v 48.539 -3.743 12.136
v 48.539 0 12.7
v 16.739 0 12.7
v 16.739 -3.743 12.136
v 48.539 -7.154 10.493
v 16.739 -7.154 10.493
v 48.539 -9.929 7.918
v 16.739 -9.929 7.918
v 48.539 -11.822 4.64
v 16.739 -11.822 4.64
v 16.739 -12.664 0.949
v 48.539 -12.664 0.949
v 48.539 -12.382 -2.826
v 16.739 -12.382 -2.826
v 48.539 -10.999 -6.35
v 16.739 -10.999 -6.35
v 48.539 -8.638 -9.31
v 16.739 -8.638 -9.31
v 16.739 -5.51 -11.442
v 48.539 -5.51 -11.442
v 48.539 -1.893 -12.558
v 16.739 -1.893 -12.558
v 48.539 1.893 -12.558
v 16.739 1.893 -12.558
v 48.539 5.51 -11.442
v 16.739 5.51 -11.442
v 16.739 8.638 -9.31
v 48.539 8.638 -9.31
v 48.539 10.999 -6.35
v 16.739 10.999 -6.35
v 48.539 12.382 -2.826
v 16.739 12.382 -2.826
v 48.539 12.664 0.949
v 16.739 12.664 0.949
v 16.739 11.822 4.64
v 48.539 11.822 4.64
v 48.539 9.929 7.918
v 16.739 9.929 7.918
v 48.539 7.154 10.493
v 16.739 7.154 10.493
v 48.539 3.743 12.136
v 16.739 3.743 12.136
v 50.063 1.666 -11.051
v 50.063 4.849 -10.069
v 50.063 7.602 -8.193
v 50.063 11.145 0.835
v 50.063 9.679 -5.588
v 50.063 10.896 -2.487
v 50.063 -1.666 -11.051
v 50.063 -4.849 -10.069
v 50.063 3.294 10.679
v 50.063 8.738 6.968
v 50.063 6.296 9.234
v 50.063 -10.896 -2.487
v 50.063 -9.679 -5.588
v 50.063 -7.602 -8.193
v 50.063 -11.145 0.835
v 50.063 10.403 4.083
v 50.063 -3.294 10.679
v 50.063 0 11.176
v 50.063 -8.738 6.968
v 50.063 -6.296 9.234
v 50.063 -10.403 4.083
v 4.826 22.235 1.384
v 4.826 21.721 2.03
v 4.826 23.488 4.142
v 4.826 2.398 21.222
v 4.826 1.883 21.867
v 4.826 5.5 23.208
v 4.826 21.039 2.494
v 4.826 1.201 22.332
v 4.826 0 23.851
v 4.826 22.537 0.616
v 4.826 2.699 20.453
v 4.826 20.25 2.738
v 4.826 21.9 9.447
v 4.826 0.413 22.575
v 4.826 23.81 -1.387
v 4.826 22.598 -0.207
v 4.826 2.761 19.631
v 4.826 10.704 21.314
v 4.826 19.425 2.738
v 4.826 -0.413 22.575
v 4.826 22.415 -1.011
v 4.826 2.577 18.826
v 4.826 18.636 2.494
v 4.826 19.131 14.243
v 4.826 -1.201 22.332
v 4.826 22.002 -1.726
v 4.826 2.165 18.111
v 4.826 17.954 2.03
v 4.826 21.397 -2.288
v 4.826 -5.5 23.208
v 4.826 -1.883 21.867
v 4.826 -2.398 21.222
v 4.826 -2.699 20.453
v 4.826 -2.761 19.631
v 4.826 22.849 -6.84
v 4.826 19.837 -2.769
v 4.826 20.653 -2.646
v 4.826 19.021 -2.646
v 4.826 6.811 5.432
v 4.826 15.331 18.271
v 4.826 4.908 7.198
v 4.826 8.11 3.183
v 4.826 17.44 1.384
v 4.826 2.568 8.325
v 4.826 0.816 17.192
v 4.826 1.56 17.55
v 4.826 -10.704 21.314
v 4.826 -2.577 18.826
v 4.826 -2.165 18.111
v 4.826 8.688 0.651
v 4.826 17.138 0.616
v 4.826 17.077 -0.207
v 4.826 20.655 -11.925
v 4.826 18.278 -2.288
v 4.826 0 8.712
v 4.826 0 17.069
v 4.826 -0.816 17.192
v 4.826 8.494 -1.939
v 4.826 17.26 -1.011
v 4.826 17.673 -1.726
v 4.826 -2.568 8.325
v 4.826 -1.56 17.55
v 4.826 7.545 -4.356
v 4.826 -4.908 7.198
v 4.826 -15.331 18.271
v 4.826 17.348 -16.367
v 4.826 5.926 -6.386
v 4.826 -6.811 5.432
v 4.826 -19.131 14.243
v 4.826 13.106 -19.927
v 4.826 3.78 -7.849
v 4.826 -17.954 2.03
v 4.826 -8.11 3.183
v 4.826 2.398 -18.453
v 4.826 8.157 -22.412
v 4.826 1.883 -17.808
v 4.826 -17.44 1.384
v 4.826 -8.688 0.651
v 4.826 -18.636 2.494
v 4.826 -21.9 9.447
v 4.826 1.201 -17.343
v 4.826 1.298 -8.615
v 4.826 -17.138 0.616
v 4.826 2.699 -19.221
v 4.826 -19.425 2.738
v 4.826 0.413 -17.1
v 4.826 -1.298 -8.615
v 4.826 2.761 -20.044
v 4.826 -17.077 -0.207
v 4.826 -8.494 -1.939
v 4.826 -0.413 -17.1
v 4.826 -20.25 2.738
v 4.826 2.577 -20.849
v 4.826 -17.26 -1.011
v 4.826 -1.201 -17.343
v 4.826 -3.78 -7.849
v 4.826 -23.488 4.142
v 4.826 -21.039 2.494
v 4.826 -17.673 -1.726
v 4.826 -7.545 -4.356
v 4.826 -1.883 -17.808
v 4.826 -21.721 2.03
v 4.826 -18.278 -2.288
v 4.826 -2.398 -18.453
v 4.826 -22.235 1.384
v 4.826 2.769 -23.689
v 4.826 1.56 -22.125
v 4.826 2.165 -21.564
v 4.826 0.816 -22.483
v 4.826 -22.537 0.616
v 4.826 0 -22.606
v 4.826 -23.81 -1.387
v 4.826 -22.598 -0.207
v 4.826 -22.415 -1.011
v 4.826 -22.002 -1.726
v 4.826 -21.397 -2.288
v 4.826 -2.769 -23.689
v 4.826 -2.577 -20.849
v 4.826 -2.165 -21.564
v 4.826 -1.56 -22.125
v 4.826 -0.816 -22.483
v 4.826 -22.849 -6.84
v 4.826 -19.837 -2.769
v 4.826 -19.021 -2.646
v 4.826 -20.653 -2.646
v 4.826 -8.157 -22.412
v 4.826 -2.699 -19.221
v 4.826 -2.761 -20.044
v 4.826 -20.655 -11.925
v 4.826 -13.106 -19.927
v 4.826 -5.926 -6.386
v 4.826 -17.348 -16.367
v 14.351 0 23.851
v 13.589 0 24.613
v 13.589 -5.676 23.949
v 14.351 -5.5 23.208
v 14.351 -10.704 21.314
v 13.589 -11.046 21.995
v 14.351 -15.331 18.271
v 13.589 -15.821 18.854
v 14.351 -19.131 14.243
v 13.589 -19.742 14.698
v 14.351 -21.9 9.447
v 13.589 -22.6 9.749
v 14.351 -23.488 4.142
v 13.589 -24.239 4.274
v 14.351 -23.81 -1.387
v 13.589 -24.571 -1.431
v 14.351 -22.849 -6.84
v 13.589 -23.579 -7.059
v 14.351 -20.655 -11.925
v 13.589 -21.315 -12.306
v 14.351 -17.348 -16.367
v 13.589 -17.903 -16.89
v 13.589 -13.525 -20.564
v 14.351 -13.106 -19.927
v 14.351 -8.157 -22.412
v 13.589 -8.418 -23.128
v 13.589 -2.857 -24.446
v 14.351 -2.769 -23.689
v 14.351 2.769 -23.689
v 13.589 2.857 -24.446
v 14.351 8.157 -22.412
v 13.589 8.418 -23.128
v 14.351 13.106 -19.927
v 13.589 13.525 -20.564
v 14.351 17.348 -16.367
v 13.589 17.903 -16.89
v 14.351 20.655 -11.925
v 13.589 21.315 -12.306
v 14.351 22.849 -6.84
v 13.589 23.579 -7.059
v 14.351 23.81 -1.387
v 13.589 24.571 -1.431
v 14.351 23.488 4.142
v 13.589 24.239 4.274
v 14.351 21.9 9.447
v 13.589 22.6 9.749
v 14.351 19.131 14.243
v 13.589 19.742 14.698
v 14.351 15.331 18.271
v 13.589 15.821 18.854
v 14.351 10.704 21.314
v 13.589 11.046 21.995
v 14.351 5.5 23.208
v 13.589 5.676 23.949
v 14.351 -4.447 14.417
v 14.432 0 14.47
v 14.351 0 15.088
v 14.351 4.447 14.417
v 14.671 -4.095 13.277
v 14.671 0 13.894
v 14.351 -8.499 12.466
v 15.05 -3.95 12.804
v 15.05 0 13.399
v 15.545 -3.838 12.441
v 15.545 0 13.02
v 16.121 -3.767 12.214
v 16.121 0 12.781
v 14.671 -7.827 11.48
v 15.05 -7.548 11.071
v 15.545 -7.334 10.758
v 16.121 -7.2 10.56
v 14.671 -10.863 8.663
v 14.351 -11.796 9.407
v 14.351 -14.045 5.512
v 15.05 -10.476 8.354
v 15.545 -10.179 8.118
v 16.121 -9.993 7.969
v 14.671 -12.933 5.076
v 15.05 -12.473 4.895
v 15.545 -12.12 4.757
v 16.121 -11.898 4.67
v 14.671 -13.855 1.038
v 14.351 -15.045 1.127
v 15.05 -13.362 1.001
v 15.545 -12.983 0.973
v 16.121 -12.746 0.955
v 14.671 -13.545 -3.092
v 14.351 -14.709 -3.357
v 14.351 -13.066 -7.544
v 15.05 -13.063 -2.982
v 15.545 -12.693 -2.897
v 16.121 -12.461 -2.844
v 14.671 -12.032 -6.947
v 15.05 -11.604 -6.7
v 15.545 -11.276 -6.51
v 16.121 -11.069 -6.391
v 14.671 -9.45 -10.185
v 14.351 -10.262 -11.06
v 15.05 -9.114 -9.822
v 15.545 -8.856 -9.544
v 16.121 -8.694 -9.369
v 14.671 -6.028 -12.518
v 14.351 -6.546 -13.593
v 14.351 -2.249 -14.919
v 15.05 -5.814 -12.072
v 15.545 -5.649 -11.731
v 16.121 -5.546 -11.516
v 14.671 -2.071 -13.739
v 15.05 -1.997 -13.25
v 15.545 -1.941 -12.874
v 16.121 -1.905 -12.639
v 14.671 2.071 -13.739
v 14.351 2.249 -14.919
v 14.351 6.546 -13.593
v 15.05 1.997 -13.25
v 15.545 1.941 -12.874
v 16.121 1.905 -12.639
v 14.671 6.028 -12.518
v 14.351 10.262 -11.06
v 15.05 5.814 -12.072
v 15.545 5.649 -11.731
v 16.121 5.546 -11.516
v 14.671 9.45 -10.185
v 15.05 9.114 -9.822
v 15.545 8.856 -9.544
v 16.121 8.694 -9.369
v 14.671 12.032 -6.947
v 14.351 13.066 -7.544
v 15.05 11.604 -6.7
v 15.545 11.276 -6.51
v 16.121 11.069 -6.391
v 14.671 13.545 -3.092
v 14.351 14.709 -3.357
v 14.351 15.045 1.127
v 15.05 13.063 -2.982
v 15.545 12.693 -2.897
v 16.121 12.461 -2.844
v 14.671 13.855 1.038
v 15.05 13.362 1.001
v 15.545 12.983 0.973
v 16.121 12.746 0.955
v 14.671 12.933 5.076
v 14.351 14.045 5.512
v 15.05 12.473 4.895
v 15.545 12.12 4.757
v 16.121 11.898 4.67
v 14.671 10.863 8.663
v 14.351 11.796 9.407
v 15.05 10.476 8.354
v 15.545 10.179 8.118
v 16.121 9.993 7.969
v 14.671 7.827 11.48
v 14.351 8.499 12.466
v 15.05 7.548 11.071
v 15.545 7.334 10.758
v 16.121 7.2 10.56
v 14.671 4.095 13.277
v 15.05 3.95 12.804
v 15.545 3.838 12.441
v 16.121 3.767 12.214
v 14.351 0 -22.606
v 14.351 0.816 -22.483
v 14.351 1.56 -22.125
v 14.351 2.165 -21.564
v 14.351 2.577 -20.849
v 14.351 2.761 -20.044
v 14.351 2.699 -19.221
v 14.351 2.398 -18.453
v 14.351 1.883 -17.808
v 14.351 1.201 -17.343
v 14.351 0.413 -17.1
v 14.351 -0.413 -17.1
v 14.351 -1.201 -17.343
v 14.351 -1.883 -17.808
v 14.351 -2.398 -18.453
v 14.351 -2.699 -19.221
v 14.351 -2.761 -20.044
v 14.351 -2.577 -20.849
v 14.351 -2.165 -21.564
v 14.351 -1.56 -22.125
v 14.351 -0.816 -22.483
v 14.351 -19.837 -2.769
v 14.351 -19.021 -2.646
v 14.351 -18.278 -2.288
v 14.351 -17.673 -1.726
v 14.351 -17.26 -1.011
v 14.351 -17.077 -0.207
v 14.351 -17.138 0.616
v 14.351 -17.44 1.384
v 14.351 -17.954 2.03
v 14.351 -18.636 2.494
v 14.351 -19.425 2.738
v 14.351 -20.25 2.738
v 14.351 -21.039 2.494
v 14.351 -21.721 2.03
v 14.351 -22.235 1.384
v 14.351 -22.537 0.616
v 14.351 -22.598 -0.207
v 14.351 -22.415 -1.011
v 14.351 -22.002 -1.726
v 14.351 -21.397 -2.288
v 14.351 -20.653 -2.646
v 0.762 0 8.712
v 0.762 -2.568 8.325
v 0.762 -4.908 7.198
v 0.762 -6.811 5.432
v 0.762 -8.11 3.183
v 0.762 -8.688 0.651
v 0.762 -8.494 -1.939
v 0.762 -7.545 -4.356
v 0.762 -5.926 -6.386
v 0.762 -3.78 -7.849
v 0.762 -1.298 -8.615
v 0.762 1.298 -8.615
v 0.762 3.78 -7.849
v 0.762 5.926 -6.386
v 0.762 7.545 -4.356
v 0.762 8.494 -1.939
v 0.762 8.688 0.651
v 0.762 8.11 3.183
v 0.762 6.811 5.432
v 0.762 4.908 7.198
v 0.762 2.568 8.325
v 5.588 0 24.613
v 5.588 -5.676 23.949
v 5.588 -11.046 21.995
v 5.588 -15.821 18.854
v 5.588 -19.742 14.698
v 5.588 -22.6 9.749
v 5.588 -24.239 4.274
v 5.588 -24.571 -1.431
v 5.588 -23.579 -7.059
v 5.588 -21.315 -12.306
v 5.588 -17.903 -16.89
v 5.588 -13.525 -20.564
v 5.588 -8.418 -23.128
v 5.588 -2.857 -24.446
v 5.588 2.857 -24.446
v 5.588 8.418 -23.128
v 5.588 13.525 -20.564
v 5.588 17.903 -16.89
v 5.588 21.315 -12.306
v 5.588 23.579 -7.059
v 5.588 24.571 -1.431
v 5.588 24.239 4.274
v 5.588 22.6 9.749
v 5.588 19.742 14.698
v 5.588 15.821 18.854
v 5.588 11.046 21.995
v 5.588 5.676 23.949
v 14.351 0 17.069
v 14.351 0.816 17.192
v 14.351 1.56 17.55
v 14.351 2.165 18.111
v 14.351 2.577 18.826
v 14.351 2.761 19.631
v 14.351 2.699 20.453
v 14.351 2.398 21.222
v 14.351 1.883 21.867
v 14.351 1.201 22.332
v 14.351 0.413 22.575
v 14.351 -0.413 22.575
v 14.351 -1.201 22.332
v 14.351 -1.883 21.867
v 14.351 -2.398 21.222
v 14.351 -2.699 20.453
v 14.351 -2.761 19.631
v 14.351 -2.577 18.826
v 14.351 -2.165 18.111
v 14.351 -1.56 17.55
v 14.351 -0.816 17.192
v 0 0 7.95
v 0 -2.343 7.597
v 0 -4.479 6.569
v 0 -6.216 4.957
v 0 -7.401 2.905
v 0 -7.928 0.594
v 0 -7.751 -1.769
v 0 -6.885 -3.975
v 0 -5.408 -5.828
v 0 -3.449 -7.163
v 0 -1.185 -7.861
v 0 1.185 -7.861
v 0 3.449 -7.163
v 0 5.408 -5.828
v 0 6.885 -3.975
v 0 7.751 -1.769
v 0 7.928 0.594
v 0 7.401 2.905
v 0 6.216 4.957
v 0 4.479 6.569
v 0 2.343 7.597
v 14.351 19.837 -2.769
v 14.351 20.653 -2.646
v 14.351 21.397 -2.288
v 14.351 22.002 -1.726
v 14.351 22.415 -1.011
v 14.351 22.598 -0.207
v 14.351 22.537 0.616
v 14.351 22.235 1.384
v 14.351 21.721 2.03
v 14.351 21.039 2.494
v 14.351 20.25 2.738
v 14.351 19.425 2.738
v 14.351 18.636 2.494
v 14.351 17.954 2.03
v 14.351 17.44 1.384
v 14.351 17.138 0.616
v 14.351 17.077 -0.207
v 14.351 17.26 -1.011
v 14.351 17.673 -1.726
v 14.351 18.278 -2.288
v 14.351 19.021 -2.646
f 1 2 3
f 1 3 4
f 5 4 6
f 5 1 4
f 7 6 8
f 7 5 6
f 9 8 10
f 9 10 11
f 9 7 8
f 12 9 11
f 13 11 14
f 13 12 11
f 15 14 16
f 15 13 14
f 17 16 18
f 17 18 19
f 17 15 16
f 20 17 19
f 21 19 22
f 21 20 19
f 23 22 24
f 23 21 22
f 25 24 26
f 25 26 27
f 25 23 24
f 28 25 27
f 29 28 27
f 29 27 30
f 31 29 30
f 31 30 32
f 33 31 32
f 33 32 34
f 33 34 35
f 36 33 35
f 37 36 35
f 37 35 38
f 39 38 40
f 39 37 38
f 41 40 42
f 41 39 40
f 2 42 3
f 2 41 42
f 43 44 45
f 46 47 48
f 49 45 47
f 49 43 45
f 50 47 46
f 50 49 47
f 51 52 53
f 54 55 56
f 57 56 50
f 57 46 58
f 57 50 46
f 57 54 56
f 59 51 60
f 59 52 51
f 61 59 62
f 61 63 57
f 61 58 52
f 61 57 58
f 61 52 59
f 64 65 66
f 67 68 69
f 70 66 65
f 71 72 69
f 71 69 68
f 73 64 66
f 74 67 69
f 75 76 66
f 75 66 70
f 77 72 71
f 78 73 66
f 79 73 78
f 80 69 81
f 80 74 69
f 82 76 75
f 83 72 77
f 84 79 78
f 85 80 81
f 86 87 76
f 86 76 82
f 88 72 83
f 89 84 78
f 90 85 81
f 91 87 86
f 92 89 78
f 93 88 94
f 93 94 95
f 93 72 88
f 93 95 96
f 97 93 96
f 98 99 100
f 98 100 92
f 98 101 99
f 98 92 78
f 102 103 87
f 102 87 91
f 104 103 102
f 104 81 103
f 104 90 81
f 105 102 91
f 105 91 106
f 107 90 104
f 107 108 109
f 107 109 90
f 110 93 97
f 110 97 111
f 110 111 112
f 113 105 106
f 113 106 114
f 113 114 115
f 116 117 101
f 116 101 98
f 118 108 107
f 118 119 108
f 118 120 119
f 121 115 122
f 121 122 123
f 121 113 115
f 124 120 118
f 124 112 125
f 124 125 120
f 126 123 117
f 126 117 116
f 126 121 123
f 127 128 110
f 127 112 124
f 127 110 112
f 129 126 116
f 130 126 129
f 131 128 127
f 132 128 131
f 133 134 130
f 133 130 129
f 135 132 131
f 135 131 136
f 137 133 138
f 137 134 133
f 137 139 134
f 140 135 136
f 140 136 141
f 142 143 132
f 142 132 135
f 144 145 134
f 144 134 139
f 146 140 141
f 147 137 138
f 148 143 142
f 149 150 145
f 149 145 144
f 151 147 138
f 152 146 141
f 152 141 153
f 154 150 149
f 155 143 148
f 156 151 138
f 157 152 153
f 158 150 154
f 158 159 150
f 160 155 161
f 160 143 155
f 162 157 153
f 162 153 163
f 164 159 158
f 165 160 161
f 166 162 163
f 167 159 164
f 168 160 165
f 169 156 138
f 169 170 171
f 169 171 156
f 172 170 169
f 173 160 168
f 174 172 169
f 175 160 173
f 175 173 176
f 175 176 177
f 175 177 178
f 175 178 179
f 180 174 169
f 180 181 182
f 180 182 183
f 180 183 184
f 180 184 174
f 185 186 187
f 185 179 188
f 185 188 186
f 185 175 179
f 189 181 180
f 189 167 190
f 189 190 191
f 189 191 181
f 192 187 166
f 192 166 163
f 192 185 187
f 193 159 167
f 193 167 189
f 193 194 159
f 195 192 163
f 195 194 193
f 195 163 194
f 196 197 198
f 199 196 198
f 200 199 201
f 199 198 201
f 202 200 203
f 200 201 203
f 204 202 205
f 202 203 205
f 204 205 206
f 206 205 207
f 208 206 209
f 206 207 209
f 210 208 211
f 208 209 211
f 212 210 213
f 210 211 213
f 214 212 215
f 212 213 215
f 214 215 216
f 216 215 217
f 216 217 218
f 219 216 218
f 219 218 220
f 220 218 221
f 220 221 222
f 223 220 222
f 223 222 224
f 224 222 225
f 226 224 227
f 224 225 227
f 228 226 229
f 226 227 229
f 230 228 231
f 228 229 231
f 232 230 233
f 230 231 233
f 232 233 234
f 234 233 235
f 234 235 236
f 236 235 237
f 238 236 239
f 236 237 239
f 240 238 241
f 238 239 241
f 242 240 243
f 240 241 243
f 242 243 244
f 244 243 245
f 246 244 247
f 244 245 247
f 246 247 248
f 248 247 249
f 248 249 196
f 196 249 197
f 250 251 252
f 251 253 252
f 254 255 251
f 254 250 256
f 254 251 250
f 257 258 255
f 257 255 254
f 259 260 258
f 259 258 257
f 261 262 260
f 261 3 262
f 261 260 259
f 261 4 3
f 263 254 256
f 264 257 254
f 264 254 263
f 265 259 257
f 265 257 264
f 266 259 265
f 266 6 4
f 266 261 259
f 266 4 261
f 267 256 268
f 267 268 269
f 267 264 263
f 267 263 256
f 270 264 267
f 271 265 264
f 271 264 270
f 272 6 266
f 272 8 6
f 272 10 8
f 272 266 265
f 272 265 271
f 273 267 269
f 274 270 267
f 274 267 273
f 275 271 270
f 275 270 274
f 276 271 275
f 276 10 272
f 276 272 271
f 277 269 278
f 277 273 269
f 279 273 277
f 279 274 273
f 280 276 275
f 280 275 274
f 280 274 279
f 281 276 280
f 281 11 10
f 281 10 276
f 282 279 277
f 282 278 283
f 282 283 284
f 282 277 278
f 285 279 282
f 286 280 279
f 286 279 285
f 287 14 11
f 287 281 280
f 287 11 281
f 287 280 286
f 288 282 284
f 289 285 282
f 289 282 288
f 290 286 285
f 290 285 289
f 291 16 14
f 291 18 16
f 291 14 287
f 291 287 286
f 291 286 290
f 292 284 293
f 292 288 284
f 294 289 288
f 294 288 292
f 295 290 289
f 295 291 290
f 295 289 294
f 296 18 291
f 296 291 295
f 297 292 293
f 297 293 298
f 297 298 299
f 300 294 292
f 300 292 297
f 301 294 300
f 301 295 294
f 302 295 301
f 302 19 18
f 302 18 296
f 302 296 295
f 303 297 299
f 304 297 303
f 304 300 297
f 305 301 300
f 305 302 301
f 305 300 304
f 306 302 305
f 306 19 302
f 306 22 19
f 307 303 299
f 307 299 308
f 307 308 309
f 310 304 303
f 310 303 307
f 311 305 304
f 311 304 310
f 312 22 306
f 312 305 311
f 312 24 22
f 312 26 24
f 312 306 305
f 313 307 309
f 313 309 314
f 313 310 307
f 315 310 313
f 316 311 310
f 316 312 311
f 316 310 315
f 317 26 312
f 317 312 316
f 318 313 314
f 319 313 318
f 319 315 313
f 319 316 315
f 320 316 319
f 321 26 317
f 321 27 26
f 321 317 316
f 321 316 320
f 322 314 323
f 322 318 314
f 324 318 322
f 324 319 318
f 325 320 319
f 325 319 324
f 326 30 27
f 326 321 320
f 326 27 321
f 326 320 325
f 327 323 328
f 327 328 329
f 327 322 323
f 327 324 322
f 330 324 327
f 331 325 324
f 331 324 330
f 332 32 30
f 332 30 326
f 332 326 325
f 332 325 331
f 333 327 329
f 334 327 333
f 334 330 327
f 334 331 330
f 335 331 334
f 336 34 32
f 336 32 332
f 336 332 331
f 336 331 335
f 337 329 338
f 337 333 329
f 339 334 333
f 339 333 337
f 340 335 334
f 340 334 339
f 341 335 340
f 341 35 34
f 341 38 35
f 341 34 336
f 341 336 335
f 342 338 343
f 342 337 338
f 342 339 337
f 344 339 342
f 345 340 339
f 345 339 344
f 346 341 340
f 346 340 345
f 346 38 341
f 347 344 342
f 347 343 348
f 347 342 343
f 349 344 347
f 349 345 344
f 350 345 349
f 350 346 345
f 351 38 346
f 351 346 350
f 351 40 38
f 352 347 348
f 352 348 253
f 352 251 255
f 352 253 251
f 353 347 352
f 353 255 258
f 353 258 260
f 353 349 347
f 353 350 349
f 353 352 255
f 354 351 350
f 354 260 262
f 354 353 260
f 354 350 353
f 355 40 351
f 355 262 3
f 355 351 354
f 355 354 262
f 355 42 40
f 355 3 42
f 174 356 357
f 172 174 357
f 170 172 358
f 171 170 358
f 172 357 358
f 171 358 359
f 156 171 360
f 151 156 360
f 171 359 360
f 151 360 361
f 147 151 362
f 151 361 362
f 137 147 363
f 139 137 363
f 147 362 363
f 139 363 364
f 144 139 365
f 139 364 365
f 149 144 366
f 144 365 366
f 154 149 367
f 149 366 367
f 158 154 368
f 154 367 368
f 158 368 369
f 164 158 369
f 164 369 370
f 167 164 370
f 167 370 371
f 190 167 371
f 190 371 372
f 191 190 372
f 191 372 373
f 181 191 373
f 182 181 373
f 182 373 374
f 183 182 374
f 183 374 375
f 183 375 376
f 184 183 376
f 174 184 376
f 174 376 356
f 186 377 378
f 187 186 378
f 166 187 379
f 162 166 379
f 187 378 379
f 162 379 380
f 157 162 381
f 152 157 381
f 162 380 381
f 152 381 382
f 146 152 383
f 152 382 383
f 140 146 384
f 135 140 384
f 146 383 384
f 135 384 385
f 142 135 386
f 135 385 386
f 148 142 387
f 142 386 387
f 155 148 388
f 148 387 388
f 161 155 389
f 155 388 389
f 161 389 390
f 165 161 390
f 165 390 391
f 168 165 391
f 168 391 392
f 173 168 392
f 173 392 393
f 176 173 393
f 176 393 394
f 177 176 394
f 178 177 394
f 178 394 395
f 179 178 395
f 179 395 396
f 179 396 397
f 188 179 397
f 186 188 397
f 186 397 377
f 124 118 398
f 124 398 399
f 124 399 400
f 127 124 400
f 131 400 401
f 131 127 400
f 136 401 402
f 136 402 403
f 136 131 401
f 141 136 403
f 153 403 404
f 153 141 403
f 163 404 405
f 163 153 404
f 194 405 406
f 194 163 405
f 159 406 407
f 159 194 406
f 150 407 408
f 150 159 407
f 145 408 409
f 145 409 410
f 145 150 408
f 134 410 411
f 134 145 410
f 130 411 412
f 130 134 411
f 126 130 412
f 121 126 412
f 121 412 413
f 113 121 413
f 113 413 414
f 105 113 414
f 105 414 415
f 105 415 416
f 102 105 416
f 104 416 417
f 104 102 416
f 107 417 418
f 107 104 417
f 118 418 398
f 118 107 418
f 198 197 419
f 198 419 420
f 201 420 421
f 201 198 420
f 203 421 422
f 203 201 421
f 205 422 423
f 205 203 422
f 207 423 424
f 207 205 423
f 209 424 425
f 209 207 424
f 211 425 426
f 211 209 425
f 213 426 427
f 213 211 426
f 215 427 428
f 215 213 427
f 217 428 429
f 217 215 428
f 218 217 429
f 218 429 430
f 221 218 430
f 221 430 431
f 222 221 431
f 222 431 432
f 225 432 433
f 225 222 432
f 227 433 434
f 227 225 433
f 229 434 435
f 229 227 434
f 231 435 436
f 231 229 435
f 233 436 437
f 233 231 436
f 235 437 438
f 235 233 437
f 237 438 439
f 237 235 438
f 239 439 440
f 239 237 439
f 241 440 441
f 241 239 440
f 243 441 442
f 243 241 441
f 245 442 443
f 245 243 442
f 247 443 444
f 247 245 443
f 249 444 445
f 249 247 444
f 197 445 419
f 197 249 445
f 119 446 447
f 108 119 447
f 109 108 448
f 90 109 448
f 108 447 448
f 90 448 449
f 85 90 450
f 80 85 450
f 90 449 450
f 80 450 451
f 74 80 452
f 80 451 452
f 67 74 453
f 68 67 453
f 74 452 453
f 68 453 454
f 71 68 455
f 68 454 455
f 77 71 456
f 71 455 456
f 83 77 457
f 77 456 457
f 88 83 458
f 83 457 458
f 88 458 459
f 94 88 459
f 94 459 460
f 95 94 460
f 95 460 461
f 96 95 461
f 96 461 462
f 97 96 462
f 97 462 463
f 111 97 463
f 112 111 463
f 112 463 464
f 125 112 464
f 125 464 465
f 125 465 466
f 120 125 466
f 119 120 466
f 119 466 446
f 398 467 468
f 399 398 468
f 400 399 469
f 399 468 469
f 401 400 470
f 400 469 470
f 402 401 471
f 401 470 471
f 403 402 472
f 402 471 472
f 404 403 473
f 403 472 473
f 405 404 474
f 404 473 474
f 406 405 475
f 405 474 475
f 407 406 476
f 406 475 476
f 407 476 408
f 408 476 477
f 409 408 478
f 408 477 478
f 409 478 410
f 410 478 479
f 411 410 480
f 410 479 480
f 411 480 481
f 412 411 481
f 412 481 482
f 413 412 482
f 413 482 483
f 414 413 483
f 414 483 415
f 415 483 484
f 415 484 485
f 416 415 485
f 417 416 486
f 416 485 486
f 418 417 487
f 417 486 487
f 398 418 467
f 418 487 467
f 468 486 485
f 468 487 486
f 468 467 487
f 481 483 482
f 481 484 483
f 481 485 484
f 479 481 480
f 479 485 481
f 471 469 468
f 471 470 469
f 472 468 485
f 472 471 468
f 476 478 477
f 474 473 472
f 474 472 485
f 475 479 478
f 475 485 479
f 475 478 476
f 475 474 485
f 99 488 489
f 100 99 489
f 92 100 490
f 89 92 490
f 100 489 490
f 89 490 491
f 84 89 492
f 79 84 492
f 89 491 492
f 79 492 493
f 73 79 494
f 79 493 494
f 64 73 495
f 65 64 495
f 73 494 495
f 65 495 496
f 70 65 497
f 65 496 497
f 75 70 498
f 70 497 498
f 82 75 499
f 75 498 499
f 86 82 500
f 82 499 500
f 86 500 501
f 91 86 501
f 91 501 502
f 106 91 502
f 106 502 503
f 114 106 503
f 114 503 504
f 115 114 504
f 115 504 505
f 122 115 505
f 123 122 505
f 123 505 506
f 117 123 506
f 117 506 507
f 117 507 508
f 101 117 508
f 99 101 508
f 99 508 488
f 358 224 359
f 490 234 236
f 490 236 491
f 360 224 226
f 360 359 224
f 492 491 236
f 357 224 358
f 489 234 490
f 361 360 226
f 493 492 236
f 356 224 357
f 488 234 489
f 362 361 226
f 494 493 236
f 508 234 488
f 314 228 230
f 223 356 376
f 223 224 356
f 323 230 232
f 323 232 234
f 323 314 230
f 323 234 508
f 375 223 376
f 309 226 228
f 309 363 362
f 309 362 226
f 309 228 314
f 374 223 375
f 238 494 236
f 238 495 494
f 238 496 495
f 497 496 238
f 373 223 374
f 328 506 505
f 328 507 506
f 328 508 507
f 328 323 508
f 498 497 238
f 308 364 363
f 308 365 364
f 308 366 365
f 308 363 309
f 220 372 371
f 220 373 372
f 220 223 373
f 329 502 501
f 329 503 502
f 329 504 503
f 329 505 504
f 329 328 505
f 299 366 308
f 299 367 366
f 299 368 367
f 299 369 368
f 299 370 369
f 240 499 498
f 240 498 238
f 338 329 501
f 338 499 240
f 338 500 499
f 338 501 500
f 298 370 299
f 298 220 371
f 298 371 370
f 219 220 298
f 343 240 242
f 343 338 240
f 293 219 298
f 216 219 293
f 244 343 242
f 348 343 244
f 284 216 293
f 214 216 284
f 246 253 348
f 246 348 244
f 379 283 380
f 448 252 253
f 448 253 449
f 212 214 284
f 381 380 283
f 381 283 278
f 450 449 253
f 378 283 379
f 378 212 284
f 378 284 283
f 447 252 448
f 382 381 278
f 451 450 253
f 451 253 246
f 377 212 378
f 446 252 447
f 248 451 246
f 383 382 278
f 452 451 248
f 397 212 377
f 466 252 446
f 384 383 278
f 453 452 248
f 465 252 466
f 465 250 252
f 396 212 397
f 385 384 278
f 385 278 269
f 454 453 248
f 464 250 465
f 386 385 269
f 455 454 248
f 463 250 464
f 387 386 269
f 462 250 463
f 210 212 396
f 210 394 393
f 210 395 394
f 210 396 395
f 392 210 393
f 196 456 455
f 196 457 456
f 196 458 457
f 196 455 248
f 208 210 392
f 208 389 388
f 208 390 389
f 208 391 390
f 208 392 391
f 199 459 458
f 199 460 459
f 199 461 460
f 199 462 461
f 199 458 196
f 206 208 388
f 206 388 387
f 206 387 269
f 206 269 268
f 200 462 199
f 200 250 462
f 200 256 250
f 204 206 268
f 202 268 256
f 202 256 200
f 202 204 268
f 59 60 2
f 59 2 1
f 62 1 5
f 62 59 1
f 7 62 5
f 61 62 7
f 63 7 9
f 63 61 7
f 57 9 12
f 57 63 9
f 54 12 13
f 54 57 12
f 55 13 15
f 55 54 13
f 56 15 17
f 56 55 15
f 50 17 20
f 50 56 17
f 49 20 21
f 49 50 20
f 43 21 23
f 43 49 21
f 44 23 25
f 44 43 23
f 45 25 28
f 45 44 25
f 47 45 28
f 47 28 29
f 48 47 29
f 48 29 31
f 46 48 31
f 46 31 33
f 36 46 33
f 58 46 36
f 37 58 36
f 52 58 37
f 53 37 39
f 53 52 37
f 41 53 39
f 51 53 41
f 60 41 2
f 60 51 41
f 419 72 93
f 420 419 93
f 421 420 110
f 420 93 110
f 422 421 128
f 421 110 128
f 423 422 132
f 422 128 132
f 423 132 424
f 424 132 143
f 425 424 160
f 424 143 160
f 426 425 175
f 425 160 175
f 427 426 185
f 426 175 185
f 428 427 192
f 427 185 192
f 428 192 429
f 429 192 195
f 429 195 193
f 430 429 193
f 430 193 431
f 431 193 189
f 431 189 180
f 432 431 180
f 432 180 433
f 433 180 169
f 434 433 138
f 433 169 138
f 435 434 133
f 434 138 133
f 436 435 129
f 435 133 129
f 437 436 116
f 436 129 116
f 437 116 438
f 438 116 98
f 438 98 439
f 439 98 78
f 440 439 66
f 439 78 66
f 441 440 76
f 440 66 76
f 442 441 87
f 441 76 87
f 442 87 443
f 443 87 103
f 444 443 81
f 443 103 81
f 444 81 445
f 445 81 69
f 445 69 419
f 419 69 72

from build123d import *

# Parameters (mm, degrees)
FILLET1_R          = 2.3876
CHAMFER1_SIZE      = 0.762
CHAMFER2_SIZE      = 1.524
CUT_EXTRUDE2_START = 14.351
SKETCH2_R          = 2.7686
CUT_EXTRUDE2_DEPTH = 76.325619122
CUT_EXTRUDE4_START = 14.351
SKETCH3_R          = 2.7686
CUT_EXTRUDE4_DEPTH = 76.325619122


with BuildPart() as part:
    # Sketch1 → Revolve1 (revolve)
    with BuildSketch(Plane(origin=(0, 0, 0), x_dir=(0, 1, 0), z_dir=(0, 0, 1)), mode=Mode.PRIVATE) as revolve1_sk:
        Polygon((0, 0), (8.7122, 0), (8.7122, -4.826), (24.6126, -4.826), (24.6126, -14.351), (12.7, -14.351), (12.7, -50.0634), (0, -50.0634), align=None)
    revolve(revolve1_sk.sketch.rotate(Axis((-25.4, 0, 0), (1, 0, 0)), 90), axis=Axis((-25.4, 0, 0), (1, 0, 0)))

    # Fillet1
    fillet1_edges = [part.edges().sort_by_distance(p)[0] for p in [
        (14.351, 0, -12.7),
    ]]
    fillet(fillet1_edges, radius=FILLET1_R)

    # Chamfer1
    chamfer1_edges = [part.edges().sort_by_distance(p)[0] for p in [
        (14.351, 0, -24.6126),
        (4.826, 0, -24.6126),
        (0, 0, -8.7122),
    ]]
    chamfer(chamfer1_edges, length=CHAMFER1_SIZE)

    # Chamfer2
    chamfer2_edges = [part.edges().sort_by_distance(p)[0] for p in [
        (50.0634, 0, -12.7),
    ]]
    chamfer(chamfer2_edges, length=CHAMFER2_SIZE)

    # Sketch2 → Cut-Extrude2 (cut, through all)
    with BuildSketch(Plane.YZ.offset(CUT_EXTRUDE2_START)):
        with Locations(Location((19.8374, 0, 0), (0, 0, 270))):
            Circle(SKETCH2_R)
    extrude(amount=-CUT_EXTRUDE2_DEPTH, mode=Mode.SUBTRACT)

    # Sketch3 → Cut-Extrude4 (cut, through all)
    with BuildSketch(Plane.YZ.offset(CUT_EXTRUDE4_START)):
        with Locations(Location((0, 19.8374, 0), (0, 0, 270))):
            Circle(SKETCH3_R)
        with Locations(Location((-19.8374, 0, 0), (0, 0, 270))):
            Circle(SKETCH3_R)
        with Locations(Location((0, -19.8374, 0), (0, 0, 270))):
            Circle(SKETCH3_R)
    extrude(amount=-CUT_EXTRUDE4_DEPTH, mode=Mode.SUBTRACT)


solid = part.part
